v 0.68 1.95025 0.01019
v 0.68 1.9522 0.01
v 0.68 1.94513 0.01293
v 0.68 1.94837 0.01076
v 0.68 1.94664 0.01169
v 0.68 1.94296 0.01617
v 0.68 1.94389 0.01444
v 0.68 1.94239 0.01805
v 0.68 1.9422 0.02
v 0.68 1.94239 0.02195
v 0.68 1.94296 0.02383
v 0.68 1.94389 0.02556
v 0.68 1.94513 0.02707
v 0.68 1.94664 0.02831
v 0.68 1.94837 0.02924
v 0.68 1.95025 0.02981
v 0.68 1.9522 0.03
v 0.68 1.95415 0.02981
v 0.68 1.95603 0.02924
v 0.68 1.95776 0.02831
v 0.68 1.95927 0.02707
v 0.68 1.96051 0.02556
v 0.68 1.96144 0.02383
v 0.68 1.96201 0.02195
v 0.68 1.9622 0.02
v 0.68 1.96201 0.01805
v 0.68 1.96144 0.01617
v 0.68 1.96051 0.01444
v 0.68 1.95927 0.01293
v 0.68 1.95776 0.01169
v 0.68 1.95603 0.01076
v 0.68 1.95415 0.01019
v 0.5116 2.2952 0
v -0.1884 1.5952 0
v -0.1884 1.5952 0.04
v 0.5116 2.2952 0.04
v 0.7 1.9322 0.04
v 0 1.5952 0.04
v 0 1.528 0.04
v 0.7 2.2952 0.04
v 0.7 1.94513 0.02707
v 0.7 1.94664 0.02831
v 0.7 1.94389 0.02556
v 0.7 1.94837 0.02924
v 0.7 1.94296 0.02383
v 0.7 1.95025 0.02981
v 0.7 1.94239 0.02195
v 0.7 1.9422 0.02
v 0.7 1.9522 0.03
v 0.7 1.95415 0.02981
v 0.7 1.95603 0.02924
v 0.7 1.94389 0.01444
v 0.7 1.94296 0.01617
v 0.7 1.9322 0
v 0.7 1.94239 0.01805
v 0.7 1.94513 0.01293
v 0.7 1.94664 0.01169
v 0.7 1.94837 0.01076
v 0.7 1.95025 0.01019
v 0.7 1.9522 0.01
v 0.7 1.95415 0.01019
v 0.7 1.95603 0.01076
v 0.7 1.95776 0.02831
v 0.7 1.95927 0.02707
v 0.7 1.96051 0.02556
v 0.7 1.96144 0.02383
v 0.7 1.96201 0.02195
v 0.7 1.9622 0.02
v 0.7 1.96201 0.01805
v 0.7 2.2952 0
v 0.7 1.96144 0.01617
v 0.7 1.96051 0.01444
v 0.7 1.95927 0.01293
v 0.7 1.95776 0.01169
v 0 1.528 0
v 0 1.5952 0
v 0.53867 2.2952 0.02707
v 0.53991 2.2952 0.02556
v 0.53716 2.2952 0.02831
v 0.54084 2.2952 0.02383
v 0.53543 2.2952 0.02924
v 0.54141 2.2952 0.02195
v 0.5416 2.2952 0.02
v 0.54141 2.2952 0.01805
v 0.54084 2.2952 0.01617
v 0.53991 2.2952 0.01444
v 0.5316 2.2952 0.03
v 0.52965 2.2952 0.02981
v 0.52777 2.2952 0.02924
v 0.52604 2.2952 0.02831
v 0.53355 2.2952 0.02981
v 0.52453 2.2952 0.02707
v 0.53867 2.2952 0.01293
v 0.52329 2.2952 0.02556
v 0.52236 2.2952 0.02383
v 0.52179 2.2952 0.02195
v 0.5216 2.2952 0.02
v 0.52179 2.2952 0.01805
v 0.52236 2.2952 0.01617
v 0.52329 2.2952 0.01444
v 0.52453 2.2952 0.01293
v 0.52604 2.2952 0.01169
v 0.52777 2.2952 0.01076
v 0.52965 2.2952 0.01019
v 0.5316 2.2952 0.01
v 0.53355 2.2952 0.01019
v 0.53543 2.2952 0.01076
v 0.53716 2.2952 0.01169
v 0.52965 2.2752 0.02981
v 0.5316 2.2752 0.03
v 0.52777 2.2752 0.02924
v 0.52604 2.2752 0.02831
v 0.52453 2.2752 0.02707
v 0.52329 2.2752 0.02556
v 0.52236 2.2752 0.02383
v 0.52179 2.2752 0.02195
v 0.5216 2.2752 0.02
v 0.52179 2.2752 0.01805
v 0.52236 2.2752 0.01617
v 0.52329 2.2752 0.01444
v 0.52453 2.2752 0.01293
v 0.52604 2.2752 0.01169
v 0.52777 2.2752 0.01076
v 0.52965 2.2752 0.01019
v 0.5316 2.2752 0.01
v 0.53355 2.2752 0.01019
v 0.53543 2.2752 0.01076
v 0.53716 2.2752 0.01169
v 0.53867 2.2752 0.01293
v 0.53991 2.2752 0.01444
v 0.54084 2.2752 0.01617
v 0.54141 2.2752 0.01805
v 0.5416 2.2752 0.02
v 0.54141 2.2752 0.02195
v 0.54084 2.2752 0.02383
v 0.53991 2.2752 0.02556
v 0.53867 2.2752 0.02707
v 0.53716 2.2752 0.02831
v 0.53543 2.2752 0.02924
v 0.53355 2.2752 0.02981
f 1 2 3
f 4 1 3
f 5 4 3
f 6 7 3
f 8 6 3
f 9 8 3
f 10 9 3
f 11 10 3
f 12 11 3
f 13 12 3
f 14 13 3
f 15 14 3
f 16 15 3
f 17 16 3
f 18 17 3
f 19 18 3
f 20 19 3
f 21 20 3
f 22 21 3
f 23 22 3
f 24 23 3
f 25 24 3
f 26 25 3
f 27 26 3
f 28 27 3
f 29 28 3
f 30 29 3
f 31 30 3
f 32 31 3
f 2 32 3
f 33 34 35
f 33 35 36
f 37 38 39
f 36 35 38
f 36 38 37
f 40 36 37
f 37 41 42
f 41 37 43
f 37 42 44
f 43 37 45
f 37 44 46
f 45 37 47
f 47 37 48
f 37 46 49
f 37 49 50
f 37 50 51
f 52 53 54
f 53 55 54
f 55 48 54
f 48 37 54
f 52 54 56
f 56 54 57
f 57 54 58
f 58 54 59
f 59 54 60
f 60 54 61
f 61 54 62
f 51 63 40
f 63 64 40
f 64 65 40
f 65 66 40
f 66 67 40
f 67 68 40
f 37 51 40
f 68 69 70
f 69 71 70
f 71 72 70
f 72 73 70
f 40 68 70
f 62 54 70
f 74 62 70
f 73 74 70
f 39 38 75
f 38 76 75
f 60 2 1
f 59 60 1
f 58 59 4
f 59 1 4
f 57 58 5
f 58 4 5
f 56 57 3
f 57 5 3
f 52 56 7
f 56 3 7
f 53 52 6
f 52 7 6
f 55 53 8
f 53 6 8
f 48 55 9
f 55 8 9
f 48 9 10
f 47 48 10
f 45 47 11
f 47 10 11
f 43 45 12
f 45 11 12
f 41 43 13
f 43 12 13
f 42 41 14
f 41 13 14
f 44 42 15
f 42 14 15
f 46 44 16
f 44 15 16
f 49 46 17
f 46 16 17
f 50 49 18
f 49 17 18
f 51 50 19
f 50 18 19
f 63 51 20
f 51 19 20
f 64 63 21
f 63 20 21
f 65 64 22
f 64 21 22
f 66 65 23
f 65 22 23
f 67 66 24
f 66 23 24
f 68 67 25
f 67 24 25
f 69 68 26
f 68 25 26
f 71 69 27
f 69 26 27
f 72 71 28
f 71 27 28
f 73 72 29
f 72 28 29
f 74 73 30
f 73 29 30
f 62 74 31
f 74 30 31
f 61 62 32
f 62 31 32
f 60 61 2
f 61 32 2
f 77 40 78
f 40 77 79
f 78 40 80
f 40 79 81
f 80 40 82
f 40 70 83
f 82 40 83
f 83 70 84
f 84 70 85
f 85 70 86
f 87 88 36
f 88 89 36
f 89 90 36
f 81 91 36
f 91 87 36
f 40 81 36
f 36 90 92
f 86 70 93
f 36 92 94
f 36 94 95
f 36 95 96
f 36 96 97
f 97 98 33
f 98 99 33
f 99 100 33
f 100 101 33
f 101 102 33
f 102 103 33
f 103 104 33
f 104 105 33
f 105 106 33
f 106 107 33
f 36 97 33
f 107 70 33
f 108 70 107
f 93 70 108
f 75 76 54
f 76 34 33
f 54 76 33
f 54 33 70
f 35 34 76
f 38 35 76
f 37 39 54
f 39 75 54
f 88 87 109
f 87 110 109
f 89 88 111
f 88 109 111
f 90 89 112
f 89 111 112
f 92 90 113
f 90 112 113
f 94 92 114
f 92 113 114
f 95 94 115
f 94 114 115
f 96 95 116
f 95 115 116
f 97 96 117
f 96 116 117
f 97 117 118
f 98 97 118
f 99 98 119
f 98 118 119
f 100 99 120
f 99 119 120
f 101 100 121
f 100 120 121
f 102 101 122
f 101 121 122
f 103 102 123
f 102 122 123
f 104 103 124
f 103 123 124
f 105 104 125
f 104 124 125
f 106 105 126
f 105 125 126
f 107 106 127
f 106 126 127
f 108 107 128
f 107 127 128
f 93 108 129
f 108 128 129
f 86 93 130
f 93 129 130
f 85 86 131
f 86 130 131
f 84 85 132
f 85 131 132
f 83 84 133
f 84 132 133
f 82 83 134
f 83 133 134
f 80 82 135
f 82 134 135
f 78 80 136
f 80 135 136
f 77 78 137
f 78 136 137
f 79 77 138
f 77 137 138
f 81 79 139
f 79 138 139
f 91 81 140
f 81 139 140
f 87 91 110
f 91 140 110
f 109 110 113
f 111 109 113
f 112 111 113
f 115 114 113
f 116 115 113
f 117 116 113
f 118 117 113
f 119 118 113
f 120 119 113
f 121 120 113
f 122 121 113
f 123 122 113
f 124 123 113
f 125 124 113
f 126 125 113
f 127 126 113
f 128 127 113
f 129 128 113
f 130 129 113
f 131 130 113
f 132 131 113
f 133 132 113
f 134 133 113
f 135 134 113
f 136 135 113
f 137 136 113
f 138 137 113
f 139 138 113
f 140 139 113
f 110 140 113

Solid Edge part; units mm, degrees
sketch "Sketch1" plane through (0, 0, 0) normal (0, 0, 1) x (1, 0, 0)
  line L0 (0.7, 1.9322) -> (0.7, 2.2952)
  line L1 (0.7, 2.2952) -> (0.5116, 2.2952)
  line L2 (-0.1884, 1.5952) -> (0.5116, 2.2952)
  line L3 (-0.1884, 1.5952) -> (0, 1.5952)
  line L4 (0, 1.5952) -> (0, 1.528)
  line L5 (0, 1.528) -> (0.7, 1.9322)
extrude "Protrusion1" add sketch "Sketch1" along normal blind 0.04
hole "Bohrung_9" at (0.7, 1.9522, 0.02) direction (-1, 0, 0) diameter 0.02 depth 0.02
hole "Bohrung_10" at (0.5316, 2.2952, 0.02) direction (0, -1, 0) diameter 0.02 depth 0.02
